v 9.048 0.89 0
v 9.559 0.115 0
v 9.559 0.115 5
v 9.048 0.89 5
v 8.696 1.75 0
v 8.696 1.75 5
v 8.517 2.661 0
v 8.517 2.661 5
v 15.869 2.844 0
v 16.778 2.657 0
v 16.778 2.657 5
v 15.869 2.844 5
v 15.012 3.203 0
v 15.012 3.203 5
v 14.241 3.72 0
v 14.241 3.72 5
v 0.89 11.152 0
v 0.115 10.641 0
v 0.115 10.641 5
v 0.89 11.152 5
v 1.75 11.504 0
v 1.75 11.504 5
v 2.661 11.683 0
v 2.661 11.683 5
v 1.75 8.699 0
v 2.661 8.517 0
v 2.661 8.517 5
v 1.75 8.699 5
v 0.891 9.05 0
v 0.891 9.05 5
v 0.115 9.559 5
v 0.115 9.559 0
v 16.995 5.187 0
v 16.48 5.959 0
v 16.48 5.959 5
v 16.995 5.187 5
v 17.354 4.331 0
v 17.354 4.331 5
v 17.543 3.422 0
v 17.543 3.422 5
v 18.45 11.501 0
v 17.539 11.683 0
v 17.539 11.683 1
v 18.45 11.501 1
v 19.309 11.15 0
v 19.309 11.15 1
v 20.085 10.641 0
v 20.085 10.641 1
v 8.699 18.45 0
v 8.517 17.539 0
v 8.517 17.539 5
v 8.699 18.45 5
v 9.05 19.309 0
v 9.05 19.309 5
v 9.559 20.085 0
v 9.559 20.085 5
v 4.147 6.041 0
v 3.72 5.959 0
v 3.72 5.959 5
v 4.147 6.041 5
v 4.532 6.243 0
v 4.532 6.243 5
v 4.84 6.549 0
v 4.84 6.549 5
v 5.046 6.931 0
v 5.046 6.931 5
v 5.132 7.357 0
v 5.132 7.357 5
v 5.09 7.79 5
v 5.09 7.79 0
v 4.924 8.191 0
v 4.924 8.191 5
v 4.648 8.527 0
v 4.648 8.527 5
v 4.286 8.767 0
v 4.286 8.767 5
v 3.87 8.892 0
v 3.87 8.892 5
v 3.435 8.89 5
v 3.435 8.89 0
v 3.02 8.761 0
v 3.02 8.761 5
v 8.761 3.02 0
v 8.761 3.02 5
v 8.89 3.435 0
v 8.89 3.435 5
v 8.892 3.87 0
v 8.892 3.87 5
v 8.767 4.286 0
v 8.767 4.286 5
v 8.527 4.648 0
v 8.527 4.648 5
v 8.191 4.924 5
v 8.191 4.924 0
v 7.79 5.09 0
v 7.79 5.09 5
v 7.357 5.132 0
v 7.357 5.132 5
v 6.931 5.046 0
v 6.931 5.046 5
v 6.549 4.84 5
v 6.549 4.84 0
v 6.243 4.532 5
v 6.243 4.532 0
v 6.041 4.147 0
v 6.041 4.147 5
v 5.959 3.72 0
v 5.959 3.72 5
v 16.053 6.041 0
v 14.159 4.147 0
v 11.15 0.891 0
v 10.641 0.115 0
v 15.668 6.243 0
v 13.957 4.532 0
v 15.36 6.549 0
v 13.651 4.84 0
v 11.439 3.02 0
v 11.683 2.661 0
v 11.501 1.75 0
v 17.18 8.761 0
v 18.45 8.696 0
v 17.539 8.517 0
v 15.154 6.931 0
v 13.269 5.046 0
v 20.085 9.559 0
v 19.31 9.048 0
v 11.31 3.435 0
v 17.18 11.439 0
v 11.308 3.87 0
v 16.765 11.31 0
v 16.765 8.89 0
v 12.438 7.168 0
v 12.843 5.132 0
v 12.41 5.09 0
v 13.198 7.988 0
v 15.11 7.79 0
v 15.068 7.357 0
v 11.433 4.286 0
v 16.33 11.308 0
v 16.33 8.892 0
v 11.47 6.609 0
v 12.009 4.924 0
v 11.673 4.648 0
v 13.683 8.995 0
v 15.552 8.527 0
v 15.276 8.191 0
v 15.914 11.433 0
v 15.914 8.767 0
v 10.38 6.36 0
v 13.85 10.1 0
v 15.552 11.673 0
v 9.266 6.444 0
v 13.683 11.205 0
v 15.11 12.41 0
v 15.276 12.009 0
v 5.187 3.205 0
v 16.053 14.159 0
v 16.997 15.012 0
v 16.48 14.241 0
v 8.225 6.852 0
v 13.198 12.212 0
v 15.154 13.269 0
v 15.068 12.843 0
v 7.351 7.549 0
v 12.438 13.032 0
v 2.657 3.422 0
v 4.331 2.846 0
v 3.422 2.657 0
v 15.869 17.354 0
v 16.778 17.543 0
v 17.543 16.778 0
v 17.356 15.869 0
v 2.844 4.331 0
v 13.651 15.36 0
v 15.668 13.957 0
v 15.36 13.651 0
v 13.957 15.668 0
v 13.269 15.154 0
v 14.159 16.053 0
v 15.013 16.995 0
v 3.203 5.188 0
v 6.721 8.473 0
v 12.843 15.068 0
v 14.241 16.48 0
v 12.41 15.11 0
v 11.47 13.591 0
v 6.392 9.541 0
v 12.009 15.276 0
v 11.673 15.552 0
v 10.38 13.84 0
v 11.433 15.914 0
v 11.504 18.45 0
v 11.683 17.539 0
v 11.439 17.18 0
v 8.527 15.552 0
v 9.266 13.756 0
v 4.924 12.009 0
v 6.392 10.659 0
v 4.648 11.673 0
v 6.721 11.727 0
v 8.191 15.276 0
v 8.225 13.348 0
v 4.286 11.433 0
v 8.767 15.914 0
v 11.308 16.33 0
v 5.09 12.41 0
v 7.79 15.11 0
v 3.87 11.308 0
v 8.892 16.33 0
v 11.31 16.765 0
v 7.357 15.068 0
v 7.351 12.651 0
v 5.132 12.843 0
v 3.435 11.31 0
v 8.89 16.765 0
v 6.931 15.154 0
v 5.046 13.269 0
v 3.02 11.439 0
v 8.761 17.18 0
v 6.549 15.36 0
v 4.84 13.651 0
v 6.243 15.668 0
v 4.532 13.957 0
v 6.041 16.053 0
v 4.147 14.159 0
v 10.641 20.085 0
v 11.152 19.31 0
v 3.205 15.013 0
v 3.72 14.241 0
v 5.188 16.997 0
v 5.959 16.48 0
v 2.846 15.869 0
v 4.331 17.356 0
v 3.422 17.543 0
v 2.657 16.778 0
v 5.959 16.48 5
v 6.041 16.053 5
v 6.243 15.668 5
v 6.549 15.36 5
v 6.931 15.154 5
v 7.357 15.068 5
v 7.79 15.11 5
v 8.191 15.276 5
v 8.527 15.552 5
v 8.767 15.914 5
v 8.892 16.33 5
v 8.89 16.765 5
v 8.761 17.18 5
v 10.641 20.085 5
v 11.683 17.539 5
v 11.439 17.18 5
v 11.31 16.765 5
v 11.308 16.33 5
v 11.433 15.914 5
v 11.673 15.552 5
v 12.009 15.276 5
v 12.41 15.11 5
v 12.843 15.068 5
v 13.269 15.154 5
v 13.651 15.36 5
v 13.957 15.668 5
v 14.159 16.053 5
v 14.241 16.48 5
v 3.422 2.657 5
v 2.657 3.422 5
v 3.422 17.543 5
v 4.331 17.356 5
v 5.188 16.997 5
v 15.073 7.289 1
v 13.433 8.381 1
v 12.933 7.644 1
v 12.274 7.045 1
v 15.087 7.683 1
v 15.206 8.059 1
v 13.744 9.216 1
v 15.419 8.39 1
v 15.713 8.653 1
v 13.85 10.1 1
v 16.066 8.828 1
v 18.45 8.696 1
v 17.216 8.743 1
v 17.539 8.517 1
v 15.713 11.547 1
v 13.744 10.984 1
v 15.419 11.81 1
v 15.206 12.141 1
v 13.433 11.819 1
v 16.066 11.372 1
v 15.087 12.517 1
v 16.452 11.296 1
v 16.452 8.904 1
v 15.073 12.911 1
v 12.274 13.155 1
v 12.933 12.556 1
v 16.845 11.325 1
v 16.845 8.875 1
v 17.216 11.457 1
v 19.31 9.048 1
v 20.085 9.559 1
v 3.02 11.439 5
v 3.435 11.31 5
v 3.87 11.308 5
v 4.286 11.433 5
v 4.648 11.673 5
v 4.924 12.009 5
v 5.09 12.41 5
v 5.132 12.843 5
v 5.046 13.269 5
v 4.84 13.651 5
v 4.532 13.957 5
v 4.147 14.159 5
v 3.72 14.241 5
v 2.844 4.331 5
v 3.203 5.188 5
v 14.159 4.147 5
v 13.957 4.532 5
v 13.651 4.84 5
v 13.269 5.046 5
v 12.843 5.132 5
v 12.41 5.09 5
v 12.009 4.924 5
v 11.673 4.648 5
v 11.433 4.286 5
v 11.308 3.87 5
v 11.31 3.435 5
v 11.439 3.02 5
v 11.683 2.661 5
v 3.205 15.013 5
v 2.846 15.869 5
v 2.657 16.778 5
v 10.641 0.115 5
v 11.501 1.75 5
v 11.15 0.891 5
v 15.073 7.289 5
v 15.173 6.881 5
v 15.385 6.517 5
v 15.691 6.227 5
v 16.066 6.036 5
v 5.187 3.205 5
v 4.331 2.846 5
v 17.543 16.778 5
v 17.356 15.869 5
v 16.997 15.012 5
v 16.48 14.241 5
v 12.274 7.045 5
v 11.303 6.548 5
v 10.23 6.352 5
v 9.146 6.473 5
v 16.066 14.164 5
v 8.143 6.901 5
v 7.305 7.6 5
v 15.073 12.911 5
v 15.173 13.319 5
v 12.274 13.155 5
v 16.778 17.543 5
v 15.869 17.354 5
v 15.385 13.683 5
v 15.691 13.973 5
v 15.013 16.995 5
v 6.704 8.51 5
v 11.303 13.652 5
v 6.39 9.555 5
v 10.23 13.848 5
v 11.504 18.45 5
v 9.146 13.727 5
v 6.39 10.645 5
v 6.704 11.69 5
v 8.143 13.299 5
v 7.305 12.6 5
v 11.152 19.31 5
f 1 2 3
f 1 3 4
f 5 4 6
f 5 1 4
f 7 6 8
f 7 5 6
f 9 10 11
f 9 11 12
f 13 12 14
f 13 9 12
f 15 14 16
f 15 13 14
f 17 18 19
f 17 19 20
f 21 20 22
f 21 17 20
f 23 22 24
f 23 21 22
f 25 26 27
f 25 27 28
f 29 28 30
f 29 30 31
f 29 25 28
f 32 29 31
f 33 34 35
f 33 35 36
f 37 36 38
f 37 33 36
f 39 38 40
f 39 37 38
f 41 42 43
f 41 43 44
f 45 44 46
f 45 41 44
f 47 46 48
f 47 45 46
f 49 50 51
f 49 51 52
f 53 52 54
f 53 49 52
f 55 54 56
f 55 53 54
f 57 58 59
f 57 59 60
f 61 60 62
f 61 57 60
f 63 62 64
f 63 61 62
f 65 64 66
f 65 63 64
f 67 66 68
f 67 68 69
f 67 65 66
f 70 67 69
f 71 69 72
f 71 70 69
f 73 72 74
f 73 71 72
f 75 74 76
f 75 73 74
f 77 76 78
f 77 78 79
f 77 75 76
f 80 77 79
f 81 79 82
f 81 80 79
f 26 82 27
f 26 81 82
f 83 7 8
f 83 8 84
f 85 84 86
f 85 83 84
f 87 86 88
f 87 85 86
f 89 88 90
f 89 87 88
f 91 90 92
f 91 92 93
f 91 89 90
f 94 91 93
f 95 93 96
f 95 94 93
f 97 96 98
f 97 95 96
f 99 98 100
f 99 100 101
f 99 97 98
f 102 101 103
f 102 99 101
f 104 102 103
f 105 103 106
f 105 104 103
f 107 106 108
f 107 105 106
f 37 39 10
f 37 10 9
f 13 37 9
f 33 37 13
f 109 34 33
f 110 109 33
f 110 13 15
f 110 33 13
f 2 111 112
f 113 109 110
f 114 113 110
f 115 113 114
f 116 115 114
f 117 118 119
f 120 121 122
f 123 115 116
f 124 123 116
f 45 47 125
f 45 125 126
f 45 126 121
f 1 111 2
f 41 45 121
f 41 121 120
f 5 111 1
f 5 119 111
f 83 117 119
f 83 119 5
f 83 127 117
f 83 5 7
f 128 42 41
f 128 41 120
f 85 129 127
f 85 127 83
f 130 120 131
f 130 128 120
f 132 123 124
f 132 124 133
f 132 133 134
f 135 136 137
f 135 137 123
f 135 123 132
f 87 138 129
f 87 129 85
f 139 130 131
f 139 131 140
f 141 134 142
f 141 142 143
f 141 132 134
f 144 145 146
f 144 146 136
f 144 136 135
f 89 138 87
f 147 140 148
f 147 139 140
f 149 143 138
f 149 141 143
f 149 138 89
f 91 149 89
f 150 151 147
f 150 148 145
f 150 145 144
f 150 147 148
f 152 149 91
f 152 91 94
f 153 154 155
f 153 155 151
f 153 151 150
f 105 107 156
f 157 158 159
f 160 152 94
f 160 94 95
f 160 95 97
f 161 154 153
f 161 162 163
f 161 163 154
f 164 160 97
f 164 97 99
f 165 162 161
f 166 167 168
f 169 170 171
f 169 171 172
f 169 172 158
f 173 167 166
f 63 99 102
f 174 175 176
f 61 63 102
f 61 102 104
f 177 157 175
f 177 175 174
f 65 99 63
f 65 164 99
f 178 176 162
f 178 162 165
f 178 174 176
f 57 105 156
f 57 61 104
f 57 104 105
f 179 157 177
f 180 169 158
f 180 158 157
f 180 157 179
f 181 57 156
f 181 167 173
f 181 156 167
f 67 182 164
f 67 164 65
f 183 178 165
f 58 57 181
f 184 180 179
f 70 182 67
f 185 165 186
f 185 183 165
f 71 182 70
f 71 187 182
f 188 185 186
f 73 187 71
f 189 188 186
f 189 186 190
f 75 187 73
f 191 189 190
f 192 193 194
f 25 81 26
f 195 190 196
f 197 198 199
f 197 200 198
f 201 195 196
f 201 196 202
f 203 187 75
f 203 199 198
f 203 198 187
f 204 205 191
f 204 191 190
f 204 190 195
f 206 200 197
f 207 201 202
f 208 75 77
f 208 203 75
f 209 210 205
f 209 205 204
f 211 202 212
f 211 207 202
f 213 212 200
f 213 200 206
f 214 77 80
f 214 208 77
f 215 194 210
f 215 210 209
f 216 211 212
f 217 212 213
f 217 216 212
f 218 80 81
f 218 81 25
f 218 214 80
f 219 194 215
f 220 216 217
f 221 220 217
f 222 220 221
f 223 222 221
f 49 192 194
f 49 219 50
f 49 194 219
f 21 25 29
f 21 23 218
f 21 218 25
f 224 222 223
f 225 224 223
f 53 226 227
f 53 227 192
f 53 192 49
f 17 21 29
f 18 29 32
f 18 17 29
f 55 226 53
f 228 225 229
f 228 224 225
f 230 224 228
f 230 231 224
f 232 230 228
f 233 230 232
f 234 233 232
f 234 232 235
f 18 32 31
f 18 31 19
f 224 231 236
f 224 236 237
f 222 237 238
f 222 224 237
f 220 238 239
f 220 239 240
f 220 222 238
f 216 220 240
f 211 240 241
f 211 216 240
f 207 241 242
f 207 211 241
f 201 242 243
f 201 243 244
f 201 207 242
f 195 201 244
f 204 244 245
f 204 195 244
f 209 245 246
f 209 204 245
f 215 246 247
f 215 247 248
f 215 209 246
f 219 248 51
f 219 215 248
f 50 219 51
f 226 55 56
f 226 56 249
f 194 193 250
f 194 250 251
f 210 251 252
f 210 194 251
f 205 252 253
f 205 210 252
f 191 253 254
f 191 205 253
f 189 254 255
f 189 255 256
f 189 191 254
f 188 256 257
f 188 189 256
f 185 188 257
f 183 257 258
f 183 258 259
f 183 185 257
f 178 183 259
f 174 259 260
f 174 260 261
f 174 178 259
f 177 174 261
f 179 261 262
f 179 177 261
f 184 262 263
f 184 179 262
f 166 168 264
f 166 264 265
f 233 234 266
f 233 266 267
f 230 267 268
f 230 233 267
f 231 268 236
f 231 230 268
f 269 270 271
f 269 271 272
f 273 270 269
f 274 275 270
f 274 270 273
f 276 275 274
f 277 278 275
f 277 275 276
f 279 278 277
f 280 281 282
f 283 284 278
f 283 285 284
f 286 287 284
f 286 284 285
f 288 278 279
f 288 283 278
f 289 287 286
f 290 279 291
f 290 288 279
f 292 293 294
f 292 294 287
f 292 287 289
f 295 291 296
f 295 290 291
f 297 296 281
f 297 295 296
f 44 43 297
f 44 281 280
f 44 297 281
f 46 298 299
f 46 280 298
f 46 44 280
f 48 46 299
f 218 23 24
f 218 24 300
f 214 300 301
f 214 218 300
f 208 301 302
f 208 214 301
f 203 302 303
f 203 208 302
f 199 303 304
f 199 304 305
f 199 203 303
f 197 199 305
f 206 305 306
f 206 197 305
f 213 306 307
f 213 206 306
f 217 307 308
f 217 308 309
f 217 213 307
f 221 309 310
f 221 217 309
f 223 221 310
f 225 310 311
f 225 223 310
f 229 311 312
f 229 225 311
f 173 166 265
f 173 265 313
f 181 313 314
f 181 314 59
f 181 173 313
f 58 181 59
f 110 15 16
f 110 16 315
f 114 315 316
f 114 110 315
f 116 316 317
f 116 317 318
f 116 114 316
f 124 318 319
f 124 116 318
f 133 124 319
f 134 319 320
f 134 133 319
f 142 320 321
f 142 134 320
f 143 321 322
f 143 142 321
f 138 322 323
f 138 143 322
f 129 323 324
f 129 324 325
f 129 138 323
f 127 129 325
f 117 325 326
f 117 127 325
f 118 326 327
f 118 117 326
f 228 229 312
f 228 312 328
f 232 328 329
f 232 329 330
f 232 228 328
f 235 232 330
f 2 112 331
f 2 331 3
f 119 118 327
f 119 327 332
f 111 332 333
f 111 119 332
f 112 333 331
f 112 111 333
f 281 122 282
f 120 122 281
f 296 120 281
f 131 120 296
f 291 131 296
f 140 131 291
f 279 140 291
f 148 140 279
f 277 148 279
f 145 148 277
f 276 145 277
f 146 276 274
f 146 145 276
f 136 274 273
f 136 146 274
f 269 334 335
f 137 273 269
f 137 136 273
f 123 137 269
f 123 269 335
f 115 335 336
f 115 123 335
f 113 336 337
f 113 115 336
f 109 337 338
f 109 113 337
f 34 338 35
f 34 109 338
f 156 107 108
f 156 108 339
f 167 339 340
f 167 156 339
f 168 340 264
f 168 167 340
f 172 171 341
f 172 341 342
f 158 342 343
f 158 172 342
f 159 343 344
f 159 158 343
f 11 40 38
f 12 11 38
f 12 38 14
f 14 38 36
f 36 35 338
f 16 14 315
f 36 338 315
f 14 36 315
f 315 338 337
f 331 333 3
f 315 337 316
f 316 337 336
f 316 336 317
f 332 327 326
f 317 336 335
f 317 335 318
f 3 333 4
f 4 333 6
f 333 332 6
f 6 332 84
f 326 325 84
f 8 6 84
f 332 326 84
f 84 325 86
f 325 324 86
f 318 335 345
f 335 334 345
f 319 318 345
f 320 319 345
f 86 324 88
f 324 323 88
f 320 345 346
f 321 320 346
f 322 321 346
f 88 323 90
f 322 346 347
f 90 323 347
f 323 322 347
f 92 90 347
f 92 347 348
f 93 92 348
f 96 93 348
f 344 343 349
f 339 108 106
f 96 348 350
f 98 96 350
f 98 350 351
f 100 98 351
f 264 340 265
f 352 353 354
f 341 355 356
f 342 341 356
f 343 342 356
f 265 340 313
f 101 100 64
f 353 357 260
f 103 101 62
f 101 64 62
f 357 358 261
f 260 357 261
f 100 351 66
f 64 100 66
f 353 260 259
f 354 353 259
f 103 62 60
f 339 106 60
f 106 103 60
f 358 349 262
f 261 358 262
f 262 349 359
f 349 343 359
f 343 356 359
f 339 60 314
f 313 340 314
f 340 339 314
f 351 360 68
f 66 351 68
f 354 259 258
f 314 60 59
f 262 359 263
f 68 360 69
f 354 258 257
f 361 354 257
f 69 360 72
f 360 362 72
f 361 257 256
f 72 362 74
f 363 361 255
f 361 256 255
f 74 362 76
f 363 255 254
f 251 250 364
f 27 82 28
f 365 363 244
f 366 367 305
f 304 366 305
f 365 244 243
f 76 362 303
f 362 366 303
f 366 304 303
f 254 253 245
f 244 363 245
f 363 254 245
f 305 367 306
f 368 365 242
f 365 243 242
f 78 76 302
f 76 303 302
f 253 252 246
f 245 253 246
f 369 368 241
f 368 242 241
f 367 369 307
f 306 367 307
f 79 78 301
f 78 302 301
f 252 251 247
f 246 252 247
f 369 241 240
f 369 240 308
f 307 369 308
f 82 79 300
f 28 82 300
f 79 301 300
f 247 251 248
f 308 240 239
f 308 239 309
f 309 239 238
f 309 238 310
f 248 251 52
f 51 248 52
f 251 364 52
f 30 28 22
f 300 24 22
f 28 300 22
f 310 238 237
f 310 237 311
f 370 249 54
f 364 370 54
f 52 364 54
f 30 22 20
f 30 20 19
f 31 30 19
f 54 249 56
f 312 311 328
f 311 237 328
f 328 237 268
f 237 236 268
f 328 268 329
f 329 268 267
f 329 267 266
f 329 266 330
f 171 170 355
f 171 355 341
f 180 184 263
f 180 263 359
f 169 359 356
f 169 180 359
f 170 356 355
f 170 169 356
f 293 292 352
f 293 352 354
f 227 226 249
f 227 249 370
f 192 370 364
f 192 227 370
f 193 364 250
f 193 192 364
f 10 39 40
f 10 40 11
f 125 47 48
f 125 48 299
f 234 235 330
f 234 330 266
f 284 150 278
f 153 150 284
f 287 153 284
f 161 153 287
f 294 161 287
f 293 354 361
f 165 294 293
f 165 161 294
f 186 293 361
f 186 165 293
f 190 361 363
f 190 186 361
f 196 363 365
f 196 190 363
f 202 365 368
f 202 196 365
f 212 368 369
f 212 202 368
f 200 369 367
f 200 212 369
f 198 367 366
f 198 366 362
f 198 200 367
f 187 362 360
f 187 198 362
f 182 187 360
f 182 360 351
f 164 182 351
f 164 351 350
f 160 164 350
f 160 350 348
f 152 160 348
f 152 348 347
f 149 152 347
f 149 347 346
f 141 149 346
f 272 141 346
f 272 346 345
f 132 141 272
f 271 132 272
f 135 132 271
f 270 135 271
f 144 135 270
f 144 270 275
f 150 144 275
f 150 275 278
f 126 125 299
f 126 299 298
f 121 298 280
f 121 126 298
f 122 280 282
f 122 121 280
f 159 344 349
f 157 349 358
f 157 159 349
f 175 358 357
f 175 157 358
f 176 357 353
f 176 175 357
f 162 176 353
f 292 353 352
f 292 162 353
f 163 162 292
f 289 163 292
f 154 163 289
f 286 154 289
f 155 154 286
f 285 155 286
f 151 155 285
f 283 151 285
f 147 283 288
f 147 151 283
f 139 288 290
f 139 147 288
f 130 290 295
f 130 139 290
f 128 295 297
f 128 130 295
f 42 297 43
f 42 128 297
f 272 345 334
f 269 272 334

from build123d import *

# Parameters (mm, degrees)
SKETCH1_R           = 3.75
BOSS_EXTRUDE1_DEPTH = 5
CUT_EXTRUDE1_DEPTH  = 4


with BuildPart() as part:
    # Sketch1 → Boss-Extrude1 (new body)
    with BuildSketch(Plane.XY):
        with BuildLine():
            Line((9.558996201, 20.085353851), (10.641002655, 20.085353851))
            ThreePointArc((10.641002655, 20.085353851), (11.348612191, 18.888750883), (11.682733536, 17.539331436))
            ThreePointArc((11.682733536, 17.539331436), (12.203470274, 15.178225243), (14.241240442, 16.479563766))
            ThreePointArc((14.241240442, 16.479563766), (15.432774832, 17.194885225), (16.778165126, 17.543258511))
            Line((16.778165126, 17.543258511), (17.543259228, 16.77816441))
            ThreePointArc((17.543259228, 16.77816441), (17.197488656, 15.431682836), (16.479564483, 14.241239725))
            ThreePointArc((16.479564483, 14.241239725), (15.178226761, 12.203469046), (17.539333159, 11.682733236))
            ThreePointArc((17.539333159, 11.682733236), (18.887683861, 11.345999843), (20.085355575, 10.641002355))
            Line((20.085355575, 10.641002355), (20.085355575, 9.558995901))
            ThreePointArc((20.085355575, 9.558995901), (18.888752607, 8.851386365), (17.539333159, 8.51726502))
            ThreePointArc((17.539333159, 8.51726502), (15.178226966, 7.996528282), (16.479565489, 5.958758114))
            ThreePointArc((16.479565489, 5.958758114), (17.194886948, 4.767223724), (17.543260234, 3.42183343))
            Line((17.543260234, 3.42183343), (16.778166133, 2.656739328))
            ThreePointArc((16.778166133, 2.656739328), (15.431684559, 3.0025099), (14.241241448, 3.720434073))
            ThreePointArc((14.241241448, 3.720434073), (12.203470769, 5.021771795), (11.682734959, 2.660665397))
            ThreePointArc((11.682734959, 2.660665397), (11.346001566, 1.312314695), (10.641004079, 0.114642981))
            Line((10.641004079, 0.114642981), (9.558997624, 0.114642981))
            ThreePointArc((9.558997624, 0.114642981), (8.851388089, 1.311245949), (8.517266743, 2.660665397))
            ThreePointArc((8.517266743, 2.660665397), (7.996530005, 5.02177159), (5.958759838, 3.720433067))
            ThreePointArc((5.958759838, 3.720433067), (4.767225448, 3.005111608), (3.421835153, 2.656738322))
            Line((3.421835153, 2.656738322), (2.656741052, 3.421832423))
            ThreePointArc((2.656741052, 3.421832423), (3.002511624, 4.768313997), (3.720435797, 5.958757108))
            ThreePointArc((3.720435797, 5.958757108), (5.021773518, 7.996527787), (2.66066712, 8.517263597))
            ThreePointArc((2.66066712, 8.517263597), (1.312316418, 8.85399699), (0.114644705, 9.558994477))
            Line((0.114644705, 9.558994477), (0.114644705, 10.641000932))
            ThreePointArc((0.114644705, 10.641000932), (1.311247673, 11.348610467), (2.66066712, 11.682731813))
            ThreePointArc((2.66066712, 11.682731813), (5.021773313, 12.203468551), (3.72043479, 14.241238718))
            ThreePointArc((3.72043479, 14.241238718), (3.005113331, 15.432773108), (2.656740045, 16.778163403))
            Line((2.656740045, 16.778163403), (3.421834146, 17.543257504))
            ThreePointArc((3.421834146, 17.543257504), (4.76831572, 17.197486932), (5.958758831, 16.479562759))
            ThreePointArc((5.958758831, 16.479562759), (7.99652951, 15.178225038), (8.51726532, 17.539331436))
            ThreePointArc((8.51726532, 17.539331436), (8.853998713, 18.887682137), (9.558996201, 20.085353851))
        make_face()
        with Locations((10.099999428, 10.099999428)):
            Circle(SKETCH1_R, mode=Mode.SUBTRACT)
    extrude(amount=BOSS_EXTRUDE1_DEPTH)

    # Sketch2 → Cut-Extrude1 (cut)
    with BuildSketch(Plane.XY.offset(5)):
        Polygon((12.190990541, 13.162654627), (12.274208264, 7.044624502), (15.074227333, 7.289583683), (15.112805831, 7.292958716), (23.65344112, 8.040134707), (23.65344112, 12.159866086), (15.074227333, 12.910415649), align=None)
    extrude(amount=-CUT_EXTRUDE1_DEPTH, mode=Mode.SUBTRACT)


solid = part.part
